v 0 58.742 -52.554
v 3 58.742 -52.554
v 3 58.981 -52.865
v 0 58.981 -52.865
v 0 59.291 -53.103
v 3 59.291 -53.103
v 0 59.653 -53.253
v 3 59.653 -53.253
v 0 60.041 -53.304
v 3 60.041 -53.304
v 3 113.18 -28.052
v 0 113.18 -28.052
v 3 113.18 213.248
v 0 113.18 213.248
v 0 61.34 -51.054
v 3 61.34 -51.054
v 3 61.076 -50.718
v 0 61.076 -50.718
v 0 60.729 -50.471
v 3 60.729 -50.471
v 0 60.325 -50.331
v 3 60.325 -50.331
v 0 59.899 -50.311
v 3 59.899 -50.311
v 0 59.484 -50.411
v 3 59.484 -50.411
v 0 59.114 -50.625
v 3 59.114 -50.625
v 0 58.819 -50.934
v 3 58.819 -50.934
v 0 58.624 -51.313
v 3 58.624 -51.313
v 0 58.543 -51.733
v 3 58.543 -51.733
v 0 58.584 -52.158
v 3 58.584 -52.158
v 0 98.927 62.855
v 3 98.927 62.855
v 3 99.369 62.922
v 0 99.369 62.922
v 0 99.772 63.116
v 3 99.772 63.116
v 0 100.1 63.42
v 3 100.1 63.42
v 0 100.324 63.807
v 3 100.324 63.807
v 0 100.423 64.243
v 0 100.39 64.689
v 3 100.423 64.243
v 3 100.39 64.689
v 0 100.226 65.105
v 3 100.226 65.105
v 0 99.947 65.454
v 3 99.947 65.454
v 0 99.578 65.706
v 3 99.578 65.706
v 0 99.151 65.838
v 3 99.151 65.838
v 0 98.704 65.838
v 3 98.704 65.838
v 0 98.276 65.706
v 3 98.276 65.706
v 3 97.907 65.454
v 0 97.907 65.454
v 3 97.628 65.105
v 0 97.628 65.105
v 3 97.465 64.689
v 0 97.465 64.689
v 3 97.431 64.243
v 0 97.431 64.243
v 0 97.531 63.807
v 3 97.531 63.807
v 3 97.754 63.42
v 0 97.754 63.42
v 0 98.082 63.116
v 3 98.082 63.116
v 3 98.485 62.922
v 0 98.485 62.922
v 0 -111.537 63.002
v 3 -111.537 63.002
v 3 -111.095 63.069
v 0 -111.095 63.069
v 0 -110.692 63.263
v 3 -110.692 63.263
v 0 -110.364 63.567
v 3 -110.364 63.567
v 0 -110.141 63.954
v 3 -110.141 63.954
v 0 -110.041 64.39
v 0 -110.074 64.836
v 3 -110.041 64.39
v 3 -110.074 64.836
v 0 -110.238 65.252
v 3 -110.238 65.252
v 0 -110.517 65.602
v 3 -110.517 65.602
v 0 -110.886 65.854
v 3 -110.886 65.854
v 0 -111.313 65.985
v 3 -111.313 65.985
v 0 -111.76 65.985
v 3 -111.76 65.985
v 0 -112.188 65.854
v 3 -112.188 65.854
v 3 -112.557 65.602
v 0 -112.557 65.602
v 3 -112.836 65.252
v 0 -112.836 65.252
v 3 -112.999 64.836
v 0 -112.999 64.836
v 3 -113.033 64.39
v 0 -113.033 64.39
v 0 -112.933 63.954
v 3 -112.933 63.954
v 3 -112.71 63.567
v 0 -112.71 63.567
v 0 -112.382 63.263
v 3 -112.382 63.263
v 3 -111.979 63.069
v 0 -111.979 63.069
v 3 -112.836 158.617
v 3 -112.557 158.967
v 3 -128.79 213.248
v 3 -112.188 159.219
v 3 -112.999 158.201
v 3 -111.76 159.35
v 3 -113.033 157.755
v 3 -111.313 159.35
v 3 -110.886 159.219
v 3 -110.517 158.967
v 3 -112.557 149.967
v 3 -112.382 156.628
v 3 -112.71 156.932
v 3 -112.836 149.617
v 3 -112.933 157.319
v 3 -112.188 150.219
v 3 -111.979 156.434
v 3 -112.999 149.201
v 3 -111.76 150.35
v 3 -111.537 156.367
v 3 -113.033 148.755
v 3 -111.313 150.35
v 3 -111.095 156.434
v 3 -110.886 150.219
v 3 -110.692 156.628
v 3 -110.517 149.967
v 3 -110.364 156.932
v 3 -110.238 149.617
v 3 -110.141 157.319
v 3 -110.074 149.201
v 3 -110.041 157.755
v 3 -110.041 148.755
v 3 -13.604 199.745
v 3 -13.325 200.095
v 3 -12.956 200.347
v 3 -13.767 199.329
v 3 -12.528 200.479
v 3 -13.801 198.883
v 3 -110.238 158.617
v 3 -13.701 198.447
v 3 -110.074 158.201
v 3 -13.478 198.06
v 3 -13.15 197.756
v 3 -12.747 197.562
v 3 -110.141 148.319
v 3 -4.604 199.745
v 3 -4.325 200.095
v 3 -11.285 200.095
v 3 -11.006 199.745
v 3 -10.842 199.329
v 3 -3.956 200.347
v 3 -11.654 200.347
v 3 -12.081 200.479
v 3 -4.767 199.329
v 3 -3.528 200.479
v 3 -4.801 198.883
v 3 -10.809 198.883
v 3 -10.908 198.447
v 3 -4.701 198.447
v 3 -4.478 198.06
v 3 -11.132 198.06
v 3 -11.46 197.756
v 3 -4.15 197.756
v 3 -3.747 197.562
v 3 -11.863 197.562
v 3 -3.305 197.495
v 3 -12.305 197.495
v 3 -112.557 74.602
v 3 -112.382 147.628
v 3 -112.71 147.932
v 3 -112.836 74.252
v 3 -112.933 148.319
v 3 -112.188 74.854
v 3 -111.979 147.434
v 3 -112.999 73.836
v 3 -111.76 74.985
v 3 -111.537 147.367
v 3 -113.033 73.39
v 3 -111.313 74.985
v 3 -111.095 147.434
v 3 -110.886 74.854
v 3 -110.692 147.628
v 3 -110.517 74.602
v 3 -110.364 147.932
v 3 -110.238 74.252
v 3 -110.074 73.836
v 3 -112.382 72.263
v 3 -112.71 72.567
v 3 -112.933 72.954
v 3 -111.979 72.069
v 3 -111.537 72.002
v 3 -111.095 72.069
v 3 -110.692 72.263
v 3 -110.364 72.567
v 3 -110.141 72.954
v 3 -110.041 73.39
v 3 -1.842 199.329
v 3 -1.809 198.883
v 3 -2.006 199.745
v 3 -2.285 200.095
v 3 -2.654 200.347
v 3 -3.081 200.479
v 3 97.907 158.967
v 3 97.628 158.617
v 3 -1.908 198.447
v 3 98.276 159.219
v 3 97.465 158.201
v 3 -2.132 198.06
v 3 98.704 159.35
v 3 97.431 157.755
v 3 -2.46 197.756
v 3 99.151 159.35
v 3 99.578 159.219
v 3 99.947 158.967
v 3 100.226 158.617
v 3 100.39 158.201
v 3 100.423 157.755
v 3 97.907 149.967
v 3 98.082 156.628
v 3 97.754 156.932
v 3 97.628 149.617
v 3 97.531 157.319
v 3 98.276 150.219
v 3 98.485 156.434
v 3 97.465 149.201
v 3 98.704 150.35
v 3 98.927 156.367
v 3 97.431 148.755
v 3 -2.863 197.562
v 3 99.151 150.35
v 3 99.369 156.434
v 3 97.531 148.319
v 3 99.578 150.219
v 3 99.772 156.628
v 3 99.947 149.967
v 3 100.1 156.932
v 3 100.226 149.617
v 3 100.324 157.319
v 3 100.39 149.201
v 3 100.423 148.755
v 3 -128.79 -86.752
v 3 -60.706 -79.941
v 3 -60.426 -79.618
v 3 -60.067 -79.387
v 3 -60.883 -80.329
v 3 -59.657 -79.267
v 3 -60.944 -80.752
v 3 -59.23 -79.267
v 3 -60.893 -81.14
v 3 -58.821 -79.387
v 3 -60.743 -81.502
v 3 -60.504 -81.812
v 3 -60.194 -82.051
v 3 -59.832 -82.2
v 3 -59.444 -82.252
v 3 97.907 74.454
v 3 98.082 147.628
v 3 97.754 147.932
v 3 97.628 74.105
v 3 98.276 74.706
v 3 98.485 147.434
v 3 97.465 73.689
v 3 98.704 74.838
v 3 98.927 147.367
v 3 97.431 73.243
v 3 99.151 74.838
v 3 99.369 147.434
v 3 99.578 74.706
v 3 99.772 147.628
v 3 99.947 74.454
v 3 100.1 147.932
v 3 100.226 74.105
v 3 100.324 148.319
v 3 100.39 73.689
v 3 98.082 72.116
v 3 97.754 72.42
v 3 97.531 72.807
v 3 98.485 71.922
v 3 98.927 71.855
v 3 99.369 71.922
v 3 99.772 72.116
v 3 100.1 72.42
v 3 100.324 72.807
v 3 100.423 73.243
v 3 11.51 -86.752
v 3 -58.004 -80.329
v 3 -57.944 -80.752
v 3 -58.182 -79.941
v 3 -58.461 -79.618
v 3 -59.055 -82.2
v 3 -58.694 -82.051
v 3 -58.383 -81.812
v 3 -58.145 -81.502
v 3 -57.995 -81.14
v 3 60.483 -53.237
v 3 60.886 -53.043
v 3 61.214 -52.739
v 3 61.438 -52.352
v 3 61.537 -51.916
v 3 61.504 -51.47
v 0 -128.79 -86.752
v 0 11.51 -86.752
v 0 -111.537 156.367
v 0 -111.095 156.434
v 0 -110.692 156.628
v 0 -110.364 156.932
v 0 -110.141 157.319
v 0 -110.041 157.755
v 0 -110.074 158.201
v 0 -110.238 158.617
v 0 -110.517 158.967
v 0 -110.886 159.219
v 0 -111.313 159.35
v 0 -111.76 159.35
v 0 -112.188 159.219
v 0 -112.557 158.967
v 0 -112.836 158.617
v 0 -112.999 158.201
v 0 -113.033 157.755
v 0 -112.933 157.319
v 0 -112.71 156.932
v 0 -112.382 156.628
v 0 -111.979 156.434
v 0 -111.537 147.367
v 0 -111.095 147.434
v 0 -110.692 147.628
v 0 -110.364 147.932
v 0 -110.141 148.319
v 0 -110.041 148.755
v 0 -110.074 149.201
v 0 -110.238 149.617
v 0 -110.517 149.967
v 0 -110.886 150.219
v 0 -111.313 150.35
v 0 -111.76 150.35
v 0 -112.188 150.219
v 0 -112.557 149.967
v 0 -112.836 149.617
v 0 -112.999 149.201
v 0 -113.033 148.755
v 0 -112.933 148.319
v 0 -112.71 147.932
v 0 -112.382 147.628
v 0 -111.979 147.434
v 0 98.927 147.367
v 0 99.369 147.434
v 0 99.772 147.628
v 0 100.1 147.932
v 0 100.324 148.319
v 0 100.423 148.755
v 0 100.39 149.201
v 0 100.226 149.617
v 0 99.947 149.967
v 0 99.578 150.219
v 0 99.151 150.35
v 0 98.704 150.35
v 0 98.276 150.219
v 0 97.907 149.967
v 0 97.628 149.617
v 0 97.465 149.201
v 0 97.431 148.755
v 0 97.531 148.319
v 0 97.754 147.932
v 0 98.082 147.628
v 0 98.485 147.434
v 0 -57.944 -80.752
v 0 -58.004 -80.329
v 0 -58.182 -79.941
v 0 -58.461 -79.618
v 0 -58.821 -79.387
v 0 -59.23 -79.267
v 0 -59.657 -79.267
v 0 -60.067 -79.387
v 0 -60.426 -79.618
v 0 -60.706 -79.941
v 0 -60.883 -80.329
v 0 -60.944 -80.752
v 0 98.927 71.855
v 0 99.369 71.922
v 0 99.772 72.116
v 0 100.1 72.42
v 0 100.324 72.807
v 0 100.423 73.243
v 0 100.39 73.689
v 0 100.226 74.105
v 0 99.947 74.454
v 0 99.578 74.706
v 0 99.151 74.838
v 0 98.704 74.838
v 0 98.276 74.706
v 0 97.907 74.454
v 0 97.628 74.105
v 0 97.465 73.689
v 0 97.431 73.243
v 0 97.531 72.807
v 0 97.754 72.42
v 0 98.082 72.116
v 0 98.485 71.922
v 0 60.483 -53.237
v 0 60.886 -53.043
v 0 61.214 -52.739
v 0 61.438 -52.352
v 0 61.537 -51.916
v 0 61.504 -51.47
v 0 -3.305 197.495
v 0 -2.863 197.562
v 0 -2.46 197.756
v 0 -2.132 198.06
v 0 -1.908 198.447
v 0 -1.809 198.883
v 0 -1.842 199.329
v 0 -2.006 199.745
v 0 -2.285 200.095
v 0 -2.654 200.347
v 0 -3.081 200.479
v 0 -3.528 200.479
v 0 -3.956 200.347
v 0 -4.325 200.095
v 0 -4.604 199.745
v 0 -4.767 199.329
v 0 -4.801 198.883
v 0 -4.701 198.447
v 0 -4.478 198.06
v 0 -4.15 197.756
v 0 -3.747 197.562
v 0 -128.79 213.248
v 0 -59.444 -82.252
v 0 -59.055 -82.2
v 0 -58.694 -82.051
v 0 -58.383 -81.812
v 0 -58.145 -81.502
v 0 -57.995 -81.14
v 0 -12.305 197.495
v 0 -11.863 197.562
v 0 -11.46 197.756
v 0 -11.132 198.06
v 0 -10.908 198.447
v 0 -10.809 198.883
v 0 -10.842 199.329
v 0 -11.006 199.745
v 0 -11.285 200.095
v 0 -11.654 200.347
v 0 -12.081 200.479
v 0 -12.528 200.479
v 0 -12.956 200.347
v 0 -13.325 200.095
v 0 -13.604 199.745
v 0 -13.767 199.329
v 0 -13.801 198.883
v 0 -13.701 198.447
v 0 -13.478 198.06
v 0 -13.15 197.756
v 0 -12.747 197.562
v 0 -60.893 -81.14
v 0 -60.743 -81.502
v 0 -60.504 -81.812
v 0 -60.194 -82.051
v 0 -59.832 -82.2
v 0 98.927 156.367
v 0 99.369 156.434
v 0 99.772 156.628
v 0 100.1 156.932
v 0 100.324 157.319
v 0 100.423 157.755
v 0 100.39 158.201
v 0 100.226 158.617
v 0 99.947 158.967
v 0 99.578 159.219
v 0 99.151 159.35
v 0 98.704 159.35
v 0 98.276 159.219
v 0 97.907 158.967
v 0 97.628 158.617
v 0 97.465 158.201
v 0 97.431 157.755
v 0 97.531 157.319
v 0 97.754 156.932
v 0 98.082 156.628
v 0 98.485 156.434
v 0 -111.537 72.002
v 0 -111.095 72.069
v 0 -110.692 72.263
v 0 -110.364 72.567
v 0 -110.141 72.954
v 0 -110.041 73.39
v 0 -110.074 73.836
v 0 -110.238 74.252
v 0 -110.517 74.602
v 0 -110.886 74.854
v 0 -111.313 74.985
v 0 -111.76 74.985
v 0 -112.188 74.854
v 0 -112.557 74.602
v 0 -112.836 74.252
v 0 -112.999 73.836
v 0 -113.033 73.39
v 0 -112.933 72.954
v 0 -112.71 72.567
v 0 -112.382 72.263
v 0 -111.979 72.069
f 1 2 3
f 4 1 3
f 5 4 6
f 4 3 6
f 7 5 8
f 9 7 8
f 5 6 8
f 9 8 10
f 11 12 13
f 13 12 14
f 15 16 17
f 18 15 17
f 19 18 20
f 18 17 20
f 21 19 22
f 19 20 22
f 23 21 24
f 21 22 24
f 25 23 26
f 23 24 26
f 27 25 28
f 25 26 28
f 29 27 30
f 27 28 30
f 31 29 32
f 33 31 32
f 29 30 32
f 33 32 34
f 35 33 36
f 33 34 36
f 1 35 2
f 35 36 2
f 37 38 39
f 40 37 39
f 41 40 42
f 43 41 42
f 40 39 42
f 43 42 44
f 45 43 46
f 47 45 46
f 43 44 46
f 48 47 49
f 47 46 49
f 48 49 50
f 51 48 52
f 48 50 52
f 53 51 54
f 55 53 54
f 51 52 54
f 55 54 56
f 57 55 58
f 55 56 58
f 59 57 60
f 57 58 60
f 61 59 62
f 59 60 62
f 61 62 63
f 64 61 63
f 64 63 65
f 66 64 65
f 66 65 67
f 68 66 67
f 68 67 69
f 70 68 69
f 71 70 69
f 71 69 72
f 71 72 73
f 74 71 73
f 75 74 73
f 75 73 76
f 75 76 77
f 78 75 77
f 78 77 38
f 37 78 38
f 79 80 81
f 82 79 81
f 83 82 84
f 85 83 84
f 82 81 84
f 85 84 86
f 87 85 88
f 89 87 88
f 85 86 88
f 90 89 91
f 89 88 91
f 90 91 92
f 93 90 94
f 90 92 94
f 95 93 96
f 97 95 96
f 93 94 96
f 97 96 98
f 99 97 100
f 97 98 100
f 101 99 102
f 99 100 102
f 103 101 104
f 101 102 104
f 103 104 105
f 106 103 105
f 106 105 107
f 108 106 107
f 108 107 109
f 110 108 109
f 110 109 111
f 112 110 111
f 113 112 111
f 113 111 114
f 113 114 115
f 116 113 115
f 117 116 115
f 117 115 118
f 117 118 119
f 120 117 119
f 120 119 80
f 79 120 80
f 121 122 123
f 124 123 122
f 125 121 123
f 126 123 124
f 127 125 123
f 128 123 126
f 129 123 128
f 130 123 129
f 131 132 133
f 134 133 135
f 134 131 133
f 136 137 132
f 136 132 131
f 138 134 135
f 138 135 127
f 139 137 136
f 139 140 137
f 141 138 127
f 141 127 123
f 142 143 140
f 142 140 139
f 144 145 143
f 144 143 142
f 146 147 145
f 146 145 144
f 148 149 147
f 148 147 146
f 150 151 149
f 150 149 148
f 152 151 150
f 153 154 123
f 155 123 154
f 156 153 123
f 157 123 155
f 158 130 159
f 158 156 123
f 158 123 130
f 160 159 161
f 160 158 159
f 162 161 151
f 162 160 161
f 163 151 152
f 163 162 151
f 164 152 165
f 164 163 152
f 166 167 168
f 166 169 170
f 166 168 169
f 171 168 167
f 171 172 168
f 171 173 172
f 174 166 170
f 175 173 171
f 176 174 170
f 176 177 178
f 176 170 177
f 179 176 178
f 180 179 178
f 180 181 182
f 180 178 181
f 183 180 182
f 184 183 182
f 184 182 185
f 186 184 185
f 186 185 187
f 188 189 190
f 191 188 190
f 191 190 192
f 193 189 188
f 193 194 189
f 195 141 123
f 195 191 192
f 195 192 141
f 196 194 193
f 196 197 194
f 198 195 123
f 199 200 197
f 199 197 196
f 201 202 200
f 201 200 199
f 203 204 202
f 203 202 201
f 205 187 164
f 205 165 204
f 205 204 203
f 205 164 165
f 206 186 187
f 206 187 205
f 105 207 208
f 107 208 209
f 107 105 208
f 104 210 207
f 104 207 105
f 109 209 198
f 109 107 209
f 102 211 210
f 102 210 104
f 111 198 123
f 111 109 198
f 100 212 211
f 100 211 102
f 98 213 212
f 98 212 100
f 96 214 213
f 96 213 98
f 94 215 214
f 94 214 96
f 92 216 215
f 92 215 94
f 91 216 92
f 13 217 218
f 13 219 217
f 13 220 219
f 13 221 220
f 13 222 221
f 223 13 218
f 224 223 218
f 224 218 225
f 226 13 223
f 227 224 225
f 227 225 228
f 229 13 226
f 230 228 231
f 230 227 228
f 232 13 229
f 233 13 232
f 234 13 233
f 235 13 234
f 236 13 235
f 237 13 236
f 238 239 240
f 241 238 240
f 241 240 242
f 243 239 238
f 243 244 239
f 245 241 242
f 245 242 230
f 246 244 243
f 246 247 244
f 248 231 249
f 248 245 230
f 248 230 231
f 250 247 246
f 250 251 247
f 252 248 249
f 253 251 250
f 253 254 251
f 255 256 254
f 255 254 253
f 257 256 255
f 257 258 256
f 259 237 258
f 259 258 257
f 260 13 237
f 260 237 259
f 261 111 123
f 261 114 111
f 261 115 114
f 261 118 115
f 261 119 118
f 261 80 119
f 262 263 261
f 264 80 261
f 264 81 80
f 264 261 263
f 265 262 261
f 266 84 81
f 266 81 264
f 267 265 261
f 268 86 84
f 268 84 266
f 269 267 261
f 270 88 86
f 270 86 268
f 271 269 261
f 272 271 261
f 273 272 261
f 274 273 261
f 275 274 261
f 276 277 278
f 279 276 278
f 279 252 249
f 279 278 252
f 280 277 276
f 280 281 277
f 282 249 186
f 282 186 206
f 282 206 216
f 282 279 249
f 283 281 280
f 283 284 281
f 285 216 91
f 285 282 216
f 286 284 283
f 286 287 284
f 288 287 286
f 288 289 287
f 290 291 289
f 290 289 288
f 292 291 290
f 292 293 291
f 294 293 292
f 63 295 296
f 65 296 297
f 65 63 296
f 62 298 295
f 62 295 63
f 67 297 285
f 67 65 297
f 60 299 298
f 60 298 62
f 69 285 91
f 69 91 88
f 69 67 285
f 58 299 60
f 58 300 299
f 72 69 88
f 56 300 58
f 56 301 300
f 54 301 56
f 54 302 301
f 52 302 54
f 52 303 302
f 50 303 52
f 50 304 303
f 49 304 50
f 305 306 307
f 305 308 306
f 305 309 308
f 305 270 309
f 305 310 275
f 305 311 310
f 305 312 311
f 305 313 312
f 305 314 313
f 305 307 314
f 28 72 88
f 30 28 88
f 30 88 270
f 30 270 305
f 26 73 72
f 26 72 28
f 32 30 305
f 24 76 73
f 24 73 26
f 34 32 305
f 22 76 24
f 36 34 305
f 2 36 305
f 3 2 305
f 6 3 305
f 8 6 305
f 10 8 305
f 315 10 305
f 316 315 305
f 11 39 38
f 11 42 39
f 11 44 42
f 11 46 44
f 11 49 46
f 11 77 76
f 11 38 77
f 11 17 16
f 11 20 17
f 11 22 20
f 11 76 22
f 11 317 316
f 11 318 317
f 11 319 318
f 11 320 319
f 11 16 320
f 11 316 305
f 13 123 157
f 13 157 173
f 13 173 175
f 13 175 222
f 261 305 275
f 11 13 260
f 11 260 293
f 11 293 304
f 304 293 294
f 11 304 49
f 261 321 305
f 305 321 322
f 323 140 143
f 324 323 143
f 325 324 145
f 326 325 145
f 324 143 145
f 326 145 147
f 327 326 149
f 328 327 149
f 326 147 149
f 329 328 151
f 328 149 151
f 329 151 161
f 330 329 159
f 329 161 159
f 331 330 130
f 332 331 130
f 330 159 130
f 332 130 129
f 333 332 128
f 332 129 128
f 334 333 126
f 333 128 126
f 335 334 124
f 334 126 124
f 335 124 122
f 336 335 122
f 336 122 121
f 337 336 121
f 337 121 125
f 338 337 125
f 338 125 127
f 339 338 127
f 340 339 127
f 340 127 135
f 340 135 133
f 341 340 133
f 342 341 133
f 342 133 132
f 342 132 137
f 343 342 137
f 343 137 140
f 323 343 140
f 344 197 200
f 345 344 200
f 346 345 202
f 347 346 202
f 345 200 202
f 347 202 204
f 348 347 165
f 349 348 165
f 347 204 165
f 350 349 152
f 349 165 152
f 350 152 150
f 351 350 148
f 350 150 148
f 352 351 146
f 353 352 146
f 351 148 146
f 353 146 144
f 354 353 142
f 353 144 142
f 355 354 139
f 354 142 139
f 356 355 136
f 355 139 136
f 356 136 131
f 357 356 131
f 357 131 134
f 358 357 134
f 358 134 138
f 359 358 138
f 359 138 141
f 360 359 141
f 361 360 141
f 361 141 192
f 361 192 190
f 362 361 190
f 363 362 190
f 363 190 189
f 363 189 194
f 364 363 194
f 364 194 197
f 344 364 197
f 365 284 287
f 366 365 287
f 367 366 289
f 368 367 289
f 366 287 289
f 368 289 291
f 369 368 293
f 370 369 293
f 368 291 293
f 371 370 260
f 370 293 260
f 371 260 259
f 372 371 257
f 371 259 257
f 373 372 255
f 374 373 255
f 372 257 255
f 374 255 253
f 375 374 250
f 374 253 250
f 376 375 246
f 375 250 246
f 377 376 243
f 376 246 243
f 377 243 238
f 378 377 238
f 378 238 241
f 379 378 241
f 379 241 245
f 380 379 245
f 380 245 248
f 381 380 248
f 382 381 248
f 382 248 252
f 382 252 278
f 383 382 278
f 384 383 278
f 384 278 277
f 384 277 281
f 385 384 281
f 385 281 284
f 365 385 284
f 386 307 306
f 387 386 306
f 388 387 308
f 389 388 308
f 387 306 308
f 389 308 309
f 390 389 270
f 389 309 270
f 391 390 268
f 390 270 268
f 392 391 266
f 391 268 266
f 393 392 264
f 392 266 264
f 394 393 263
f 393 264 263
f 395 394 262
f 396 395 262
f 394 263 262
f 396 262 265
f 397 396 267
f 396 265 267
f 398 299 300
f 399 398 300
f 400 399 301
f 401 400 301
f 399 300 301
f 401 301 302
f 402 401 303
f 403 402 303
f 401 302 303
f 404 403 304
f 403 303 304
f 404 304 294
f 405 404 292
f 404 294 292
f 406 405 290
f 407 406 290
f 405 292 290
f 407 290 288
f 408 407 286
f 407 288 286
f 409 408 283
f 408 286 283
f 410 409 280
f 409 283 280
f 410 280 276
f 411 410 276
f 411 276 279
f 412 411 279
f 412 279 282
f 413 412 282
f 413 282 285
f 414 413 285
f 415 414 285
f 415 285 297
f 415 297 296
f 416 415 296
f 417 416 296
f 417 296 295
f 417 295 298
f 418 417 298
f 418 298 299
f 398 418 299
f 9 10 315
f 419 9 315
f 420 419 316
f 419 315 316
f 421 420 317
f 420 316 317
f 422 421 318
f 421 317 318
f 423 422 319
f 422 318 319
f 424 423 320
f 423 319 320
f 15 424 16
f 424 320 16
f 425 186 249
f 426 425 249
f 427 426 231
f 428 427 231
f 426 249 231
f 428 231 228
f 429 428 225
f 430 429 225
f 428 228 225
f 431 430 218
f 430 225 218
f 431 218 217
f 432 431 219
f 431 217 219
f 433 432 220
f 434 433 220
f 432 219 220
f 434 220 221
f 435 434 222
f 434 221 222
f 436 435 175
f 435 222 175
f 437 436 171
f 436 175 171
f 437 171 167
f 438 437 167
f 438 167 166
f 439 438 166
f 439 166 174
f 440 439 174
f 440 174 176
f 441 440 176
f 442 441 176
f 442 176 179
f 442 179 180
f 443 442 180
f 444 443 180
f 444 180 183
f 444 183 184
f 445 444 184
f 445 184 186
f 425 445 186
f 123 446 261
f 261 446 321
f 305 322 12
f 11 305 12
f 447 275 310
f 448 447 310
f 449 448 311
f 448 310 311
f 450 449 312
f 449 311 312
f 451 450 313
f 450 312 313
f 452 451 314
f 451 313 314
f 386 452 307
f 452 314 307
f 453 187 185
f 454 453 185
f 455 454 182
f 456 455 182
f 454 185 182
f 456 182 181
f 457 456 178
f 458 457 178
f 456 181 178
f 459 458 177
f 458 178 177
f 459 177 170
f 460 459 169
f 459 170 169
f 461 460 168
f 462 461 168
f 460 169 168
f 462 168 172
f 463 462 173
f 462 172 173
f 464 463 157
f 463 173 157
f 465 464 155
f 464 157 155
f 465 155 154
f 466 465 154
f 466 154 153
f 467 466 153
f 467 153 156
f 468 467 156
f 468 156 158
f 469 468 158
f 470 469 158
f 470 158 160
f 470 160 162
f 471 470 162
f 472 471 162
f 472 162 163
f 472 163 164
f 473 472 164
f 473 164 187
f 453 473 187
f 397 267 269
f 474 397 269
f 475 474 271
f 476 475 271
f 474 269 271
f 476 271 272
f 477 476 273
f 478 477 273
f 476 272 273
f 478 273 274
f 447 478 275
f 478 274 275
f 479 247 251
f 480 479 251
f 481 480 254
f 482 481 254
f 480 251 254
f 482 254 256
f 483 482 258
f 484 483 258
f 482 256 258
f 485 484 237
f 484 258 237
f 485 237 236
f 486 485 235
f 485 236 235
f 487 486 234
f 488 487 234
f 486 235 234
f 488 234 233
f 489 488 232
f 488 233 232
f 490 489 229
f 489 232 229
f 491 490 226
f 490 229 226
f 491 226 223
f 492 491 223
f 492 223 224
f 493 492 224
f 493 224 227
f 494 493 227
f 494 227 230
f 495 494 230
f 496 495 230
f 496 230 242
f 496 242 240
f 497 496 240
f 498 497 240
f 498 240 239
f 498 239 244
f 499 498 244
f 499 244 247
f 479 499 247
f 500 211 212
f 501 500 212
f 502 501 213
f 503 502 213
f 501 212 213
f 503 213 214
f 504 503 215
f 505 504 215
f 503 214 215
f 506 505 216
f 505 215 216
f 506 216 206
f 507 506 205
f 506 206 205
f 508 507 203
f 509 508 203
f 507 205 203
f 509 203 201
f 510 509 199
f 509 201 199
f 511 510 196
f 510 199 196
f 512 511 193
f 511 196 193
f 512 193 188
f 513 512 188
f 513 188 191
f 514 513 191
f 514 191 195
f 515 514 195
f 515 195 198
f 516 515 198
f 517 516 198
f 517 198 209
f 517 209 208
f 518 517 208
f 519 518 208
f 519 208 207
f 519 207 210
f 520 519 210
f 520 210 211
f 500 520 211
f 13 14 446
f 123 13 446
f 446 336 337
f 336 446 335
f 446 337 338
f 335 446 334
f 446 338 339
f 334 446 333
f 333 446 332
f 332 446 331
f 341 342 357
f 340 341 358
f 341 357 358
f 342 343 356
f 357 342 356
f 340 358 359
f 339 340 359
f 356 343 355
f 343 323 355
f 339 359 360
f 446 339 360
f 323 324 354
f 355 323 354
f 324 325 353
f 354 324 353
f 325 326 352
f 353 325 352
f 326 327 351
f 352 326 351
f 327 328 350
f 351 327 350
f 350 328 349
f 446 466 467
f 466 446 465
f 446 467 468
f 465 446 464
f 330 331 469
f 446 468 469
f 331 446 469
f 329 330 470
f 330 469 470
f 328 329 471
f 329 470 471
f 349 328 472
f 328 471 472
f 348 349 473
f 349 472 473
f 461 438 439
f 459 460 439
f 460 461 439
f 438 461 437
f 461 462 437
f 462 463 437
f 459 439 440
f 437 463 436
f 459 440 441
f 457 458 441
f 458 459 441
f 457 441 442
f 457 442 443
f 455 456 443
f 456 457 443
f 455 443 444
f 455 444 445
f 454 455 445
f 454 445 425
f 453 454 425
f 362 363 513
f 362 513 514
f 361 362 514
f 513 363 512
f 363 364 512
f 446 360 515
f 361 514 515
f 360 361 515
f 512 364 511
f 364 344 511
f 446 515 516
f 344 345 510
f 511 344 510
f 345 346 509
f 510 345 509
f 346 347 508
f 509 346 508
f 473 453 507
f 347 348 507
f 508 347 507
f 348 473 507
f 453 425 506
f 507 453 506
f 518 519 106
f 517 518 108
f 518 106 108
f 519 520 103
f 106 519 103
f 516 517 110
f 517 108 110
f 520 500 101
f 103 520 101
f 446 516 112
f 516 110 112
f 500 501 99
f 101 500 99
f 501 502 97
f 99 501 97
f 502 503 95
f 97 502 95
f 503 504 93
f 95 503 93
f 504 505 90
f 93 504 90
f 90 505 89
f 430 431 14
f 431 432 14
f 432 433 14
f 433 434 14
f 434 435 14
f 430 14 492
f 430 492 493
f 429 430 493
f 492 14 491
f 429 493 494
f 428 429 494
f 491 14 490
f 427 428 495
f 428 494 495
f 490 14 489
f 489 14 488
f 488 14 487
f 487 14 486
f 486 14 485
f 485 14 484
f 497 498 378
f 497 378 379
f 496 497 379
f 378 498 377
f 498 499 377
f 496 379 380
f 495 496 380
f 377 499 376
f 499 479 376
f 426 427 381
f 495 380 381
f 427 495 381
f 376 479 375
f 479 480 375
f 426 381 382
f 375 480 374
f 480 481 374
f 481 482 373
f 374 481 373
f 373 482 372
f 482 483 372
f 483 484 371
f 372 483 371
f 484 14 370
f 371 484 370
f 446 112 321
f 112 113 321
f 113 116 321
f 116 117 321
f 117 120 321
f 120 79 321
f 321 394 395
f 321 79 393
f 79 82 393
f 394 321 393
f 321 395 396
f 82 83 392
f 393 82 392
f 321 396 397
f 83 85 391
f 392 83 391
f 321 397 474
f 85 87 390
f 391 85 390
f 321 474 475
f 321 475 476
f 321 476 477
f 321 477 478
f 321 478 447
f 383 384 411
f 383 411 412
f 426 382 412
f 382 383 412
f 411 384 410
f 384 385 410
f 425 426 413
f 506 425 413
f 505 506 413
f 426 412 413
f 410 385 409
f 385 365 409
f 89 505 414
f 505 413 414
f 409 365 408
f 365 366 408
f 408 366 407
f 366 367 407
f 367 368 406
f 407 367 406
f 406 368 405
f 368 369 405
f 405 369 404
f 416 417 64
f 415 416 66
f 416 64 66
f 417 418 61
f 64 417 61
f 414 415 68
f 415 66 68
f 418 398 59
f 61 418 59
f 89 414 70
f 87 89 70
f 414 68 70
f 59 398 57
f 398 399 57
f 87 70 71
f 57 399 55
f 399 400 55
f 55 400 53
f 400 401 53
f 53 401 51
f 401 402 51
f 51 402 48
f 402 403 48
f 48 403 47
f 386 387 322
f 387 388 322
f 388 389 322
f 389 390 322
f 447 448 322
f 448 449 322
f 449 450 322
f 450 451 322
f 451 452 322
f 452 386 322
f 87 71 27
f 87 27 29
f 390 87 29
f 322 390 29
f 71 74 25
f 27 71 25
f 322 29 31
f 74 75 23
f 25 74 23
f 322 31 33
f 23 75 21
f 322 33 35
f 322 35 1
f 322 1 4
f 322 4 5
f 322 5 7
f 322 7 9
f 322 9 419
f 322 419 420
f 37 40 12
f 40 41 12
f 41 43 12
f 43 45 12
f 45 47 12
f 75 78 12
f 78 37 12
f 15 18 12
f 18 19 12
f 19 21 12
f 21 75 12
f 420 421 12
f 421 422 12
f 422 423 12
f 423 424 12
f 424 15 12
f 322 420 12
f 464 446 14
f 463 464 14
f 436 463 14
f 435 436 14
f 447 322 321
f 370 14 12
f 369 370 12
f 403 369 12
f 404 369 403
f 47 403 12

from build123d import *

# Parameters (mm, degrees)
BOSS_EXTRUDE1_DEPTH = 3
SKETCH2_R           = 1.5
CUT_EXTRUDE1_DEPTH  = 10
CUT_EXTRUDE2_DEPTH  = 10


with BuildPart() as part:
    # Sketch1 → Boss-Extrude1 (new body)
    with BuildSketch(Plane(origin=(0, 0, 0), x_dir=(0, 0, -1), z_dir=(1, 0, 0))):
        Polygon((-213.248407643, 113.180191083), (-213.248407643, -128.789808917), (86.751592357, -128.789808917), (86.751592357, 11.510191083), (28.052390488, 113.180191083), align=None)
    extrude(amount=BOSS_EXTRUDE1_DEPTH)

    # Sketch2 → Cut-Extrude1 (cut)
    with BuildSketch(Plane(origin=(3, 0, 0), x_dir=(0, 0, -1), z_dir=(1, 0, 0))):
        with Locations((-157.867084277, -111.53685774)):
            Circle(SKETCH2_R)
        with Locations((-148.867084277, -111.53685774)):
            Circle(SKETCH2_R)
        with Locations((-73.502207501, -111.53685774)):
            Circle(SKETCH2_R)
        with Locations((-64.502207501, -111.53685774)):
            Circle(SKETCH2_R)
        with Locations((-64.354867412, 98.927239906)):
            Circle(SKETCH2_R)
        with Locations((-73.354867412, 98.927239906)):
            Circle(SKETCH2_R)
        with Locations((-148.867084277, 98.927239906)):
            Circle(SKETCH2_R)
        with Locations((-157.867084277, 98.927239906)):
            Circle(SKETCH2_R)
        with Locations((-198.995456466, -3.304808917)):
            Circle(SKETCH2_R)
        with Locations((-198.995456466, -12.304808917)):
            Circle(SKETCH2_R)
    extrude(amount=-CUT_EXTRUDE1_DEPTH, mode=Mode.SUBTRACT)

    # Sketch3 → Cut-Extrude2 (cut)
    with BuildSketch(Plane(origin=(3, 0, 0), x_dir=(0, 0, -1), z_dir=(1, 0, 0))):
        with BuildLine():
            ThreePointArc((80.751592357, -57.943656494), (79.251592357, -59.443656494), (80.751592357, -60.943656494))
            Line((80.751592357, -60.943656494), (80.751592357, -57.943656494))
        make_face()
        with BuildLine():
            Line((80.751592357, -57.943656494), (80.751592357, -60.943656494))
            ThreePointArc((80.751592357, -60.943656494), (81.812252528, -60.504316666), (82.251592357, -59.443656494))
            ThreePointArc((82.251592357, -59.443656494), (81.812252528, -58.382996323), (80.751592357, -57.943656494))
        make_face()
        with BuildLine():
            ThreePointArc((51.053915211, 61.340381611), (50.504877105, 59.291343506), (52.553915211, 58.7423054))
            Line((52.553915211, 58.7423054), (51.053915211, 61.340381611))
        make_face()
        with BuildLine():
            Line((51.053915211, 61.340381611), (52.553915211, 58.7423054))
            ThreePointArc((52.553915211, 58.7423054), (53.102953317, 59.291343506), (53.303915211, 60.041343506))
            ThreePointArc((53.303915211, 60.041343506), (52.553915211, 61.340381611), (51.053915211, 61.340381611))
        make_face()
    extrude(amount=-CUT_EXTRUDE2_DEPTH, mode=Mode.SUBTRACT)


solid = part.part
